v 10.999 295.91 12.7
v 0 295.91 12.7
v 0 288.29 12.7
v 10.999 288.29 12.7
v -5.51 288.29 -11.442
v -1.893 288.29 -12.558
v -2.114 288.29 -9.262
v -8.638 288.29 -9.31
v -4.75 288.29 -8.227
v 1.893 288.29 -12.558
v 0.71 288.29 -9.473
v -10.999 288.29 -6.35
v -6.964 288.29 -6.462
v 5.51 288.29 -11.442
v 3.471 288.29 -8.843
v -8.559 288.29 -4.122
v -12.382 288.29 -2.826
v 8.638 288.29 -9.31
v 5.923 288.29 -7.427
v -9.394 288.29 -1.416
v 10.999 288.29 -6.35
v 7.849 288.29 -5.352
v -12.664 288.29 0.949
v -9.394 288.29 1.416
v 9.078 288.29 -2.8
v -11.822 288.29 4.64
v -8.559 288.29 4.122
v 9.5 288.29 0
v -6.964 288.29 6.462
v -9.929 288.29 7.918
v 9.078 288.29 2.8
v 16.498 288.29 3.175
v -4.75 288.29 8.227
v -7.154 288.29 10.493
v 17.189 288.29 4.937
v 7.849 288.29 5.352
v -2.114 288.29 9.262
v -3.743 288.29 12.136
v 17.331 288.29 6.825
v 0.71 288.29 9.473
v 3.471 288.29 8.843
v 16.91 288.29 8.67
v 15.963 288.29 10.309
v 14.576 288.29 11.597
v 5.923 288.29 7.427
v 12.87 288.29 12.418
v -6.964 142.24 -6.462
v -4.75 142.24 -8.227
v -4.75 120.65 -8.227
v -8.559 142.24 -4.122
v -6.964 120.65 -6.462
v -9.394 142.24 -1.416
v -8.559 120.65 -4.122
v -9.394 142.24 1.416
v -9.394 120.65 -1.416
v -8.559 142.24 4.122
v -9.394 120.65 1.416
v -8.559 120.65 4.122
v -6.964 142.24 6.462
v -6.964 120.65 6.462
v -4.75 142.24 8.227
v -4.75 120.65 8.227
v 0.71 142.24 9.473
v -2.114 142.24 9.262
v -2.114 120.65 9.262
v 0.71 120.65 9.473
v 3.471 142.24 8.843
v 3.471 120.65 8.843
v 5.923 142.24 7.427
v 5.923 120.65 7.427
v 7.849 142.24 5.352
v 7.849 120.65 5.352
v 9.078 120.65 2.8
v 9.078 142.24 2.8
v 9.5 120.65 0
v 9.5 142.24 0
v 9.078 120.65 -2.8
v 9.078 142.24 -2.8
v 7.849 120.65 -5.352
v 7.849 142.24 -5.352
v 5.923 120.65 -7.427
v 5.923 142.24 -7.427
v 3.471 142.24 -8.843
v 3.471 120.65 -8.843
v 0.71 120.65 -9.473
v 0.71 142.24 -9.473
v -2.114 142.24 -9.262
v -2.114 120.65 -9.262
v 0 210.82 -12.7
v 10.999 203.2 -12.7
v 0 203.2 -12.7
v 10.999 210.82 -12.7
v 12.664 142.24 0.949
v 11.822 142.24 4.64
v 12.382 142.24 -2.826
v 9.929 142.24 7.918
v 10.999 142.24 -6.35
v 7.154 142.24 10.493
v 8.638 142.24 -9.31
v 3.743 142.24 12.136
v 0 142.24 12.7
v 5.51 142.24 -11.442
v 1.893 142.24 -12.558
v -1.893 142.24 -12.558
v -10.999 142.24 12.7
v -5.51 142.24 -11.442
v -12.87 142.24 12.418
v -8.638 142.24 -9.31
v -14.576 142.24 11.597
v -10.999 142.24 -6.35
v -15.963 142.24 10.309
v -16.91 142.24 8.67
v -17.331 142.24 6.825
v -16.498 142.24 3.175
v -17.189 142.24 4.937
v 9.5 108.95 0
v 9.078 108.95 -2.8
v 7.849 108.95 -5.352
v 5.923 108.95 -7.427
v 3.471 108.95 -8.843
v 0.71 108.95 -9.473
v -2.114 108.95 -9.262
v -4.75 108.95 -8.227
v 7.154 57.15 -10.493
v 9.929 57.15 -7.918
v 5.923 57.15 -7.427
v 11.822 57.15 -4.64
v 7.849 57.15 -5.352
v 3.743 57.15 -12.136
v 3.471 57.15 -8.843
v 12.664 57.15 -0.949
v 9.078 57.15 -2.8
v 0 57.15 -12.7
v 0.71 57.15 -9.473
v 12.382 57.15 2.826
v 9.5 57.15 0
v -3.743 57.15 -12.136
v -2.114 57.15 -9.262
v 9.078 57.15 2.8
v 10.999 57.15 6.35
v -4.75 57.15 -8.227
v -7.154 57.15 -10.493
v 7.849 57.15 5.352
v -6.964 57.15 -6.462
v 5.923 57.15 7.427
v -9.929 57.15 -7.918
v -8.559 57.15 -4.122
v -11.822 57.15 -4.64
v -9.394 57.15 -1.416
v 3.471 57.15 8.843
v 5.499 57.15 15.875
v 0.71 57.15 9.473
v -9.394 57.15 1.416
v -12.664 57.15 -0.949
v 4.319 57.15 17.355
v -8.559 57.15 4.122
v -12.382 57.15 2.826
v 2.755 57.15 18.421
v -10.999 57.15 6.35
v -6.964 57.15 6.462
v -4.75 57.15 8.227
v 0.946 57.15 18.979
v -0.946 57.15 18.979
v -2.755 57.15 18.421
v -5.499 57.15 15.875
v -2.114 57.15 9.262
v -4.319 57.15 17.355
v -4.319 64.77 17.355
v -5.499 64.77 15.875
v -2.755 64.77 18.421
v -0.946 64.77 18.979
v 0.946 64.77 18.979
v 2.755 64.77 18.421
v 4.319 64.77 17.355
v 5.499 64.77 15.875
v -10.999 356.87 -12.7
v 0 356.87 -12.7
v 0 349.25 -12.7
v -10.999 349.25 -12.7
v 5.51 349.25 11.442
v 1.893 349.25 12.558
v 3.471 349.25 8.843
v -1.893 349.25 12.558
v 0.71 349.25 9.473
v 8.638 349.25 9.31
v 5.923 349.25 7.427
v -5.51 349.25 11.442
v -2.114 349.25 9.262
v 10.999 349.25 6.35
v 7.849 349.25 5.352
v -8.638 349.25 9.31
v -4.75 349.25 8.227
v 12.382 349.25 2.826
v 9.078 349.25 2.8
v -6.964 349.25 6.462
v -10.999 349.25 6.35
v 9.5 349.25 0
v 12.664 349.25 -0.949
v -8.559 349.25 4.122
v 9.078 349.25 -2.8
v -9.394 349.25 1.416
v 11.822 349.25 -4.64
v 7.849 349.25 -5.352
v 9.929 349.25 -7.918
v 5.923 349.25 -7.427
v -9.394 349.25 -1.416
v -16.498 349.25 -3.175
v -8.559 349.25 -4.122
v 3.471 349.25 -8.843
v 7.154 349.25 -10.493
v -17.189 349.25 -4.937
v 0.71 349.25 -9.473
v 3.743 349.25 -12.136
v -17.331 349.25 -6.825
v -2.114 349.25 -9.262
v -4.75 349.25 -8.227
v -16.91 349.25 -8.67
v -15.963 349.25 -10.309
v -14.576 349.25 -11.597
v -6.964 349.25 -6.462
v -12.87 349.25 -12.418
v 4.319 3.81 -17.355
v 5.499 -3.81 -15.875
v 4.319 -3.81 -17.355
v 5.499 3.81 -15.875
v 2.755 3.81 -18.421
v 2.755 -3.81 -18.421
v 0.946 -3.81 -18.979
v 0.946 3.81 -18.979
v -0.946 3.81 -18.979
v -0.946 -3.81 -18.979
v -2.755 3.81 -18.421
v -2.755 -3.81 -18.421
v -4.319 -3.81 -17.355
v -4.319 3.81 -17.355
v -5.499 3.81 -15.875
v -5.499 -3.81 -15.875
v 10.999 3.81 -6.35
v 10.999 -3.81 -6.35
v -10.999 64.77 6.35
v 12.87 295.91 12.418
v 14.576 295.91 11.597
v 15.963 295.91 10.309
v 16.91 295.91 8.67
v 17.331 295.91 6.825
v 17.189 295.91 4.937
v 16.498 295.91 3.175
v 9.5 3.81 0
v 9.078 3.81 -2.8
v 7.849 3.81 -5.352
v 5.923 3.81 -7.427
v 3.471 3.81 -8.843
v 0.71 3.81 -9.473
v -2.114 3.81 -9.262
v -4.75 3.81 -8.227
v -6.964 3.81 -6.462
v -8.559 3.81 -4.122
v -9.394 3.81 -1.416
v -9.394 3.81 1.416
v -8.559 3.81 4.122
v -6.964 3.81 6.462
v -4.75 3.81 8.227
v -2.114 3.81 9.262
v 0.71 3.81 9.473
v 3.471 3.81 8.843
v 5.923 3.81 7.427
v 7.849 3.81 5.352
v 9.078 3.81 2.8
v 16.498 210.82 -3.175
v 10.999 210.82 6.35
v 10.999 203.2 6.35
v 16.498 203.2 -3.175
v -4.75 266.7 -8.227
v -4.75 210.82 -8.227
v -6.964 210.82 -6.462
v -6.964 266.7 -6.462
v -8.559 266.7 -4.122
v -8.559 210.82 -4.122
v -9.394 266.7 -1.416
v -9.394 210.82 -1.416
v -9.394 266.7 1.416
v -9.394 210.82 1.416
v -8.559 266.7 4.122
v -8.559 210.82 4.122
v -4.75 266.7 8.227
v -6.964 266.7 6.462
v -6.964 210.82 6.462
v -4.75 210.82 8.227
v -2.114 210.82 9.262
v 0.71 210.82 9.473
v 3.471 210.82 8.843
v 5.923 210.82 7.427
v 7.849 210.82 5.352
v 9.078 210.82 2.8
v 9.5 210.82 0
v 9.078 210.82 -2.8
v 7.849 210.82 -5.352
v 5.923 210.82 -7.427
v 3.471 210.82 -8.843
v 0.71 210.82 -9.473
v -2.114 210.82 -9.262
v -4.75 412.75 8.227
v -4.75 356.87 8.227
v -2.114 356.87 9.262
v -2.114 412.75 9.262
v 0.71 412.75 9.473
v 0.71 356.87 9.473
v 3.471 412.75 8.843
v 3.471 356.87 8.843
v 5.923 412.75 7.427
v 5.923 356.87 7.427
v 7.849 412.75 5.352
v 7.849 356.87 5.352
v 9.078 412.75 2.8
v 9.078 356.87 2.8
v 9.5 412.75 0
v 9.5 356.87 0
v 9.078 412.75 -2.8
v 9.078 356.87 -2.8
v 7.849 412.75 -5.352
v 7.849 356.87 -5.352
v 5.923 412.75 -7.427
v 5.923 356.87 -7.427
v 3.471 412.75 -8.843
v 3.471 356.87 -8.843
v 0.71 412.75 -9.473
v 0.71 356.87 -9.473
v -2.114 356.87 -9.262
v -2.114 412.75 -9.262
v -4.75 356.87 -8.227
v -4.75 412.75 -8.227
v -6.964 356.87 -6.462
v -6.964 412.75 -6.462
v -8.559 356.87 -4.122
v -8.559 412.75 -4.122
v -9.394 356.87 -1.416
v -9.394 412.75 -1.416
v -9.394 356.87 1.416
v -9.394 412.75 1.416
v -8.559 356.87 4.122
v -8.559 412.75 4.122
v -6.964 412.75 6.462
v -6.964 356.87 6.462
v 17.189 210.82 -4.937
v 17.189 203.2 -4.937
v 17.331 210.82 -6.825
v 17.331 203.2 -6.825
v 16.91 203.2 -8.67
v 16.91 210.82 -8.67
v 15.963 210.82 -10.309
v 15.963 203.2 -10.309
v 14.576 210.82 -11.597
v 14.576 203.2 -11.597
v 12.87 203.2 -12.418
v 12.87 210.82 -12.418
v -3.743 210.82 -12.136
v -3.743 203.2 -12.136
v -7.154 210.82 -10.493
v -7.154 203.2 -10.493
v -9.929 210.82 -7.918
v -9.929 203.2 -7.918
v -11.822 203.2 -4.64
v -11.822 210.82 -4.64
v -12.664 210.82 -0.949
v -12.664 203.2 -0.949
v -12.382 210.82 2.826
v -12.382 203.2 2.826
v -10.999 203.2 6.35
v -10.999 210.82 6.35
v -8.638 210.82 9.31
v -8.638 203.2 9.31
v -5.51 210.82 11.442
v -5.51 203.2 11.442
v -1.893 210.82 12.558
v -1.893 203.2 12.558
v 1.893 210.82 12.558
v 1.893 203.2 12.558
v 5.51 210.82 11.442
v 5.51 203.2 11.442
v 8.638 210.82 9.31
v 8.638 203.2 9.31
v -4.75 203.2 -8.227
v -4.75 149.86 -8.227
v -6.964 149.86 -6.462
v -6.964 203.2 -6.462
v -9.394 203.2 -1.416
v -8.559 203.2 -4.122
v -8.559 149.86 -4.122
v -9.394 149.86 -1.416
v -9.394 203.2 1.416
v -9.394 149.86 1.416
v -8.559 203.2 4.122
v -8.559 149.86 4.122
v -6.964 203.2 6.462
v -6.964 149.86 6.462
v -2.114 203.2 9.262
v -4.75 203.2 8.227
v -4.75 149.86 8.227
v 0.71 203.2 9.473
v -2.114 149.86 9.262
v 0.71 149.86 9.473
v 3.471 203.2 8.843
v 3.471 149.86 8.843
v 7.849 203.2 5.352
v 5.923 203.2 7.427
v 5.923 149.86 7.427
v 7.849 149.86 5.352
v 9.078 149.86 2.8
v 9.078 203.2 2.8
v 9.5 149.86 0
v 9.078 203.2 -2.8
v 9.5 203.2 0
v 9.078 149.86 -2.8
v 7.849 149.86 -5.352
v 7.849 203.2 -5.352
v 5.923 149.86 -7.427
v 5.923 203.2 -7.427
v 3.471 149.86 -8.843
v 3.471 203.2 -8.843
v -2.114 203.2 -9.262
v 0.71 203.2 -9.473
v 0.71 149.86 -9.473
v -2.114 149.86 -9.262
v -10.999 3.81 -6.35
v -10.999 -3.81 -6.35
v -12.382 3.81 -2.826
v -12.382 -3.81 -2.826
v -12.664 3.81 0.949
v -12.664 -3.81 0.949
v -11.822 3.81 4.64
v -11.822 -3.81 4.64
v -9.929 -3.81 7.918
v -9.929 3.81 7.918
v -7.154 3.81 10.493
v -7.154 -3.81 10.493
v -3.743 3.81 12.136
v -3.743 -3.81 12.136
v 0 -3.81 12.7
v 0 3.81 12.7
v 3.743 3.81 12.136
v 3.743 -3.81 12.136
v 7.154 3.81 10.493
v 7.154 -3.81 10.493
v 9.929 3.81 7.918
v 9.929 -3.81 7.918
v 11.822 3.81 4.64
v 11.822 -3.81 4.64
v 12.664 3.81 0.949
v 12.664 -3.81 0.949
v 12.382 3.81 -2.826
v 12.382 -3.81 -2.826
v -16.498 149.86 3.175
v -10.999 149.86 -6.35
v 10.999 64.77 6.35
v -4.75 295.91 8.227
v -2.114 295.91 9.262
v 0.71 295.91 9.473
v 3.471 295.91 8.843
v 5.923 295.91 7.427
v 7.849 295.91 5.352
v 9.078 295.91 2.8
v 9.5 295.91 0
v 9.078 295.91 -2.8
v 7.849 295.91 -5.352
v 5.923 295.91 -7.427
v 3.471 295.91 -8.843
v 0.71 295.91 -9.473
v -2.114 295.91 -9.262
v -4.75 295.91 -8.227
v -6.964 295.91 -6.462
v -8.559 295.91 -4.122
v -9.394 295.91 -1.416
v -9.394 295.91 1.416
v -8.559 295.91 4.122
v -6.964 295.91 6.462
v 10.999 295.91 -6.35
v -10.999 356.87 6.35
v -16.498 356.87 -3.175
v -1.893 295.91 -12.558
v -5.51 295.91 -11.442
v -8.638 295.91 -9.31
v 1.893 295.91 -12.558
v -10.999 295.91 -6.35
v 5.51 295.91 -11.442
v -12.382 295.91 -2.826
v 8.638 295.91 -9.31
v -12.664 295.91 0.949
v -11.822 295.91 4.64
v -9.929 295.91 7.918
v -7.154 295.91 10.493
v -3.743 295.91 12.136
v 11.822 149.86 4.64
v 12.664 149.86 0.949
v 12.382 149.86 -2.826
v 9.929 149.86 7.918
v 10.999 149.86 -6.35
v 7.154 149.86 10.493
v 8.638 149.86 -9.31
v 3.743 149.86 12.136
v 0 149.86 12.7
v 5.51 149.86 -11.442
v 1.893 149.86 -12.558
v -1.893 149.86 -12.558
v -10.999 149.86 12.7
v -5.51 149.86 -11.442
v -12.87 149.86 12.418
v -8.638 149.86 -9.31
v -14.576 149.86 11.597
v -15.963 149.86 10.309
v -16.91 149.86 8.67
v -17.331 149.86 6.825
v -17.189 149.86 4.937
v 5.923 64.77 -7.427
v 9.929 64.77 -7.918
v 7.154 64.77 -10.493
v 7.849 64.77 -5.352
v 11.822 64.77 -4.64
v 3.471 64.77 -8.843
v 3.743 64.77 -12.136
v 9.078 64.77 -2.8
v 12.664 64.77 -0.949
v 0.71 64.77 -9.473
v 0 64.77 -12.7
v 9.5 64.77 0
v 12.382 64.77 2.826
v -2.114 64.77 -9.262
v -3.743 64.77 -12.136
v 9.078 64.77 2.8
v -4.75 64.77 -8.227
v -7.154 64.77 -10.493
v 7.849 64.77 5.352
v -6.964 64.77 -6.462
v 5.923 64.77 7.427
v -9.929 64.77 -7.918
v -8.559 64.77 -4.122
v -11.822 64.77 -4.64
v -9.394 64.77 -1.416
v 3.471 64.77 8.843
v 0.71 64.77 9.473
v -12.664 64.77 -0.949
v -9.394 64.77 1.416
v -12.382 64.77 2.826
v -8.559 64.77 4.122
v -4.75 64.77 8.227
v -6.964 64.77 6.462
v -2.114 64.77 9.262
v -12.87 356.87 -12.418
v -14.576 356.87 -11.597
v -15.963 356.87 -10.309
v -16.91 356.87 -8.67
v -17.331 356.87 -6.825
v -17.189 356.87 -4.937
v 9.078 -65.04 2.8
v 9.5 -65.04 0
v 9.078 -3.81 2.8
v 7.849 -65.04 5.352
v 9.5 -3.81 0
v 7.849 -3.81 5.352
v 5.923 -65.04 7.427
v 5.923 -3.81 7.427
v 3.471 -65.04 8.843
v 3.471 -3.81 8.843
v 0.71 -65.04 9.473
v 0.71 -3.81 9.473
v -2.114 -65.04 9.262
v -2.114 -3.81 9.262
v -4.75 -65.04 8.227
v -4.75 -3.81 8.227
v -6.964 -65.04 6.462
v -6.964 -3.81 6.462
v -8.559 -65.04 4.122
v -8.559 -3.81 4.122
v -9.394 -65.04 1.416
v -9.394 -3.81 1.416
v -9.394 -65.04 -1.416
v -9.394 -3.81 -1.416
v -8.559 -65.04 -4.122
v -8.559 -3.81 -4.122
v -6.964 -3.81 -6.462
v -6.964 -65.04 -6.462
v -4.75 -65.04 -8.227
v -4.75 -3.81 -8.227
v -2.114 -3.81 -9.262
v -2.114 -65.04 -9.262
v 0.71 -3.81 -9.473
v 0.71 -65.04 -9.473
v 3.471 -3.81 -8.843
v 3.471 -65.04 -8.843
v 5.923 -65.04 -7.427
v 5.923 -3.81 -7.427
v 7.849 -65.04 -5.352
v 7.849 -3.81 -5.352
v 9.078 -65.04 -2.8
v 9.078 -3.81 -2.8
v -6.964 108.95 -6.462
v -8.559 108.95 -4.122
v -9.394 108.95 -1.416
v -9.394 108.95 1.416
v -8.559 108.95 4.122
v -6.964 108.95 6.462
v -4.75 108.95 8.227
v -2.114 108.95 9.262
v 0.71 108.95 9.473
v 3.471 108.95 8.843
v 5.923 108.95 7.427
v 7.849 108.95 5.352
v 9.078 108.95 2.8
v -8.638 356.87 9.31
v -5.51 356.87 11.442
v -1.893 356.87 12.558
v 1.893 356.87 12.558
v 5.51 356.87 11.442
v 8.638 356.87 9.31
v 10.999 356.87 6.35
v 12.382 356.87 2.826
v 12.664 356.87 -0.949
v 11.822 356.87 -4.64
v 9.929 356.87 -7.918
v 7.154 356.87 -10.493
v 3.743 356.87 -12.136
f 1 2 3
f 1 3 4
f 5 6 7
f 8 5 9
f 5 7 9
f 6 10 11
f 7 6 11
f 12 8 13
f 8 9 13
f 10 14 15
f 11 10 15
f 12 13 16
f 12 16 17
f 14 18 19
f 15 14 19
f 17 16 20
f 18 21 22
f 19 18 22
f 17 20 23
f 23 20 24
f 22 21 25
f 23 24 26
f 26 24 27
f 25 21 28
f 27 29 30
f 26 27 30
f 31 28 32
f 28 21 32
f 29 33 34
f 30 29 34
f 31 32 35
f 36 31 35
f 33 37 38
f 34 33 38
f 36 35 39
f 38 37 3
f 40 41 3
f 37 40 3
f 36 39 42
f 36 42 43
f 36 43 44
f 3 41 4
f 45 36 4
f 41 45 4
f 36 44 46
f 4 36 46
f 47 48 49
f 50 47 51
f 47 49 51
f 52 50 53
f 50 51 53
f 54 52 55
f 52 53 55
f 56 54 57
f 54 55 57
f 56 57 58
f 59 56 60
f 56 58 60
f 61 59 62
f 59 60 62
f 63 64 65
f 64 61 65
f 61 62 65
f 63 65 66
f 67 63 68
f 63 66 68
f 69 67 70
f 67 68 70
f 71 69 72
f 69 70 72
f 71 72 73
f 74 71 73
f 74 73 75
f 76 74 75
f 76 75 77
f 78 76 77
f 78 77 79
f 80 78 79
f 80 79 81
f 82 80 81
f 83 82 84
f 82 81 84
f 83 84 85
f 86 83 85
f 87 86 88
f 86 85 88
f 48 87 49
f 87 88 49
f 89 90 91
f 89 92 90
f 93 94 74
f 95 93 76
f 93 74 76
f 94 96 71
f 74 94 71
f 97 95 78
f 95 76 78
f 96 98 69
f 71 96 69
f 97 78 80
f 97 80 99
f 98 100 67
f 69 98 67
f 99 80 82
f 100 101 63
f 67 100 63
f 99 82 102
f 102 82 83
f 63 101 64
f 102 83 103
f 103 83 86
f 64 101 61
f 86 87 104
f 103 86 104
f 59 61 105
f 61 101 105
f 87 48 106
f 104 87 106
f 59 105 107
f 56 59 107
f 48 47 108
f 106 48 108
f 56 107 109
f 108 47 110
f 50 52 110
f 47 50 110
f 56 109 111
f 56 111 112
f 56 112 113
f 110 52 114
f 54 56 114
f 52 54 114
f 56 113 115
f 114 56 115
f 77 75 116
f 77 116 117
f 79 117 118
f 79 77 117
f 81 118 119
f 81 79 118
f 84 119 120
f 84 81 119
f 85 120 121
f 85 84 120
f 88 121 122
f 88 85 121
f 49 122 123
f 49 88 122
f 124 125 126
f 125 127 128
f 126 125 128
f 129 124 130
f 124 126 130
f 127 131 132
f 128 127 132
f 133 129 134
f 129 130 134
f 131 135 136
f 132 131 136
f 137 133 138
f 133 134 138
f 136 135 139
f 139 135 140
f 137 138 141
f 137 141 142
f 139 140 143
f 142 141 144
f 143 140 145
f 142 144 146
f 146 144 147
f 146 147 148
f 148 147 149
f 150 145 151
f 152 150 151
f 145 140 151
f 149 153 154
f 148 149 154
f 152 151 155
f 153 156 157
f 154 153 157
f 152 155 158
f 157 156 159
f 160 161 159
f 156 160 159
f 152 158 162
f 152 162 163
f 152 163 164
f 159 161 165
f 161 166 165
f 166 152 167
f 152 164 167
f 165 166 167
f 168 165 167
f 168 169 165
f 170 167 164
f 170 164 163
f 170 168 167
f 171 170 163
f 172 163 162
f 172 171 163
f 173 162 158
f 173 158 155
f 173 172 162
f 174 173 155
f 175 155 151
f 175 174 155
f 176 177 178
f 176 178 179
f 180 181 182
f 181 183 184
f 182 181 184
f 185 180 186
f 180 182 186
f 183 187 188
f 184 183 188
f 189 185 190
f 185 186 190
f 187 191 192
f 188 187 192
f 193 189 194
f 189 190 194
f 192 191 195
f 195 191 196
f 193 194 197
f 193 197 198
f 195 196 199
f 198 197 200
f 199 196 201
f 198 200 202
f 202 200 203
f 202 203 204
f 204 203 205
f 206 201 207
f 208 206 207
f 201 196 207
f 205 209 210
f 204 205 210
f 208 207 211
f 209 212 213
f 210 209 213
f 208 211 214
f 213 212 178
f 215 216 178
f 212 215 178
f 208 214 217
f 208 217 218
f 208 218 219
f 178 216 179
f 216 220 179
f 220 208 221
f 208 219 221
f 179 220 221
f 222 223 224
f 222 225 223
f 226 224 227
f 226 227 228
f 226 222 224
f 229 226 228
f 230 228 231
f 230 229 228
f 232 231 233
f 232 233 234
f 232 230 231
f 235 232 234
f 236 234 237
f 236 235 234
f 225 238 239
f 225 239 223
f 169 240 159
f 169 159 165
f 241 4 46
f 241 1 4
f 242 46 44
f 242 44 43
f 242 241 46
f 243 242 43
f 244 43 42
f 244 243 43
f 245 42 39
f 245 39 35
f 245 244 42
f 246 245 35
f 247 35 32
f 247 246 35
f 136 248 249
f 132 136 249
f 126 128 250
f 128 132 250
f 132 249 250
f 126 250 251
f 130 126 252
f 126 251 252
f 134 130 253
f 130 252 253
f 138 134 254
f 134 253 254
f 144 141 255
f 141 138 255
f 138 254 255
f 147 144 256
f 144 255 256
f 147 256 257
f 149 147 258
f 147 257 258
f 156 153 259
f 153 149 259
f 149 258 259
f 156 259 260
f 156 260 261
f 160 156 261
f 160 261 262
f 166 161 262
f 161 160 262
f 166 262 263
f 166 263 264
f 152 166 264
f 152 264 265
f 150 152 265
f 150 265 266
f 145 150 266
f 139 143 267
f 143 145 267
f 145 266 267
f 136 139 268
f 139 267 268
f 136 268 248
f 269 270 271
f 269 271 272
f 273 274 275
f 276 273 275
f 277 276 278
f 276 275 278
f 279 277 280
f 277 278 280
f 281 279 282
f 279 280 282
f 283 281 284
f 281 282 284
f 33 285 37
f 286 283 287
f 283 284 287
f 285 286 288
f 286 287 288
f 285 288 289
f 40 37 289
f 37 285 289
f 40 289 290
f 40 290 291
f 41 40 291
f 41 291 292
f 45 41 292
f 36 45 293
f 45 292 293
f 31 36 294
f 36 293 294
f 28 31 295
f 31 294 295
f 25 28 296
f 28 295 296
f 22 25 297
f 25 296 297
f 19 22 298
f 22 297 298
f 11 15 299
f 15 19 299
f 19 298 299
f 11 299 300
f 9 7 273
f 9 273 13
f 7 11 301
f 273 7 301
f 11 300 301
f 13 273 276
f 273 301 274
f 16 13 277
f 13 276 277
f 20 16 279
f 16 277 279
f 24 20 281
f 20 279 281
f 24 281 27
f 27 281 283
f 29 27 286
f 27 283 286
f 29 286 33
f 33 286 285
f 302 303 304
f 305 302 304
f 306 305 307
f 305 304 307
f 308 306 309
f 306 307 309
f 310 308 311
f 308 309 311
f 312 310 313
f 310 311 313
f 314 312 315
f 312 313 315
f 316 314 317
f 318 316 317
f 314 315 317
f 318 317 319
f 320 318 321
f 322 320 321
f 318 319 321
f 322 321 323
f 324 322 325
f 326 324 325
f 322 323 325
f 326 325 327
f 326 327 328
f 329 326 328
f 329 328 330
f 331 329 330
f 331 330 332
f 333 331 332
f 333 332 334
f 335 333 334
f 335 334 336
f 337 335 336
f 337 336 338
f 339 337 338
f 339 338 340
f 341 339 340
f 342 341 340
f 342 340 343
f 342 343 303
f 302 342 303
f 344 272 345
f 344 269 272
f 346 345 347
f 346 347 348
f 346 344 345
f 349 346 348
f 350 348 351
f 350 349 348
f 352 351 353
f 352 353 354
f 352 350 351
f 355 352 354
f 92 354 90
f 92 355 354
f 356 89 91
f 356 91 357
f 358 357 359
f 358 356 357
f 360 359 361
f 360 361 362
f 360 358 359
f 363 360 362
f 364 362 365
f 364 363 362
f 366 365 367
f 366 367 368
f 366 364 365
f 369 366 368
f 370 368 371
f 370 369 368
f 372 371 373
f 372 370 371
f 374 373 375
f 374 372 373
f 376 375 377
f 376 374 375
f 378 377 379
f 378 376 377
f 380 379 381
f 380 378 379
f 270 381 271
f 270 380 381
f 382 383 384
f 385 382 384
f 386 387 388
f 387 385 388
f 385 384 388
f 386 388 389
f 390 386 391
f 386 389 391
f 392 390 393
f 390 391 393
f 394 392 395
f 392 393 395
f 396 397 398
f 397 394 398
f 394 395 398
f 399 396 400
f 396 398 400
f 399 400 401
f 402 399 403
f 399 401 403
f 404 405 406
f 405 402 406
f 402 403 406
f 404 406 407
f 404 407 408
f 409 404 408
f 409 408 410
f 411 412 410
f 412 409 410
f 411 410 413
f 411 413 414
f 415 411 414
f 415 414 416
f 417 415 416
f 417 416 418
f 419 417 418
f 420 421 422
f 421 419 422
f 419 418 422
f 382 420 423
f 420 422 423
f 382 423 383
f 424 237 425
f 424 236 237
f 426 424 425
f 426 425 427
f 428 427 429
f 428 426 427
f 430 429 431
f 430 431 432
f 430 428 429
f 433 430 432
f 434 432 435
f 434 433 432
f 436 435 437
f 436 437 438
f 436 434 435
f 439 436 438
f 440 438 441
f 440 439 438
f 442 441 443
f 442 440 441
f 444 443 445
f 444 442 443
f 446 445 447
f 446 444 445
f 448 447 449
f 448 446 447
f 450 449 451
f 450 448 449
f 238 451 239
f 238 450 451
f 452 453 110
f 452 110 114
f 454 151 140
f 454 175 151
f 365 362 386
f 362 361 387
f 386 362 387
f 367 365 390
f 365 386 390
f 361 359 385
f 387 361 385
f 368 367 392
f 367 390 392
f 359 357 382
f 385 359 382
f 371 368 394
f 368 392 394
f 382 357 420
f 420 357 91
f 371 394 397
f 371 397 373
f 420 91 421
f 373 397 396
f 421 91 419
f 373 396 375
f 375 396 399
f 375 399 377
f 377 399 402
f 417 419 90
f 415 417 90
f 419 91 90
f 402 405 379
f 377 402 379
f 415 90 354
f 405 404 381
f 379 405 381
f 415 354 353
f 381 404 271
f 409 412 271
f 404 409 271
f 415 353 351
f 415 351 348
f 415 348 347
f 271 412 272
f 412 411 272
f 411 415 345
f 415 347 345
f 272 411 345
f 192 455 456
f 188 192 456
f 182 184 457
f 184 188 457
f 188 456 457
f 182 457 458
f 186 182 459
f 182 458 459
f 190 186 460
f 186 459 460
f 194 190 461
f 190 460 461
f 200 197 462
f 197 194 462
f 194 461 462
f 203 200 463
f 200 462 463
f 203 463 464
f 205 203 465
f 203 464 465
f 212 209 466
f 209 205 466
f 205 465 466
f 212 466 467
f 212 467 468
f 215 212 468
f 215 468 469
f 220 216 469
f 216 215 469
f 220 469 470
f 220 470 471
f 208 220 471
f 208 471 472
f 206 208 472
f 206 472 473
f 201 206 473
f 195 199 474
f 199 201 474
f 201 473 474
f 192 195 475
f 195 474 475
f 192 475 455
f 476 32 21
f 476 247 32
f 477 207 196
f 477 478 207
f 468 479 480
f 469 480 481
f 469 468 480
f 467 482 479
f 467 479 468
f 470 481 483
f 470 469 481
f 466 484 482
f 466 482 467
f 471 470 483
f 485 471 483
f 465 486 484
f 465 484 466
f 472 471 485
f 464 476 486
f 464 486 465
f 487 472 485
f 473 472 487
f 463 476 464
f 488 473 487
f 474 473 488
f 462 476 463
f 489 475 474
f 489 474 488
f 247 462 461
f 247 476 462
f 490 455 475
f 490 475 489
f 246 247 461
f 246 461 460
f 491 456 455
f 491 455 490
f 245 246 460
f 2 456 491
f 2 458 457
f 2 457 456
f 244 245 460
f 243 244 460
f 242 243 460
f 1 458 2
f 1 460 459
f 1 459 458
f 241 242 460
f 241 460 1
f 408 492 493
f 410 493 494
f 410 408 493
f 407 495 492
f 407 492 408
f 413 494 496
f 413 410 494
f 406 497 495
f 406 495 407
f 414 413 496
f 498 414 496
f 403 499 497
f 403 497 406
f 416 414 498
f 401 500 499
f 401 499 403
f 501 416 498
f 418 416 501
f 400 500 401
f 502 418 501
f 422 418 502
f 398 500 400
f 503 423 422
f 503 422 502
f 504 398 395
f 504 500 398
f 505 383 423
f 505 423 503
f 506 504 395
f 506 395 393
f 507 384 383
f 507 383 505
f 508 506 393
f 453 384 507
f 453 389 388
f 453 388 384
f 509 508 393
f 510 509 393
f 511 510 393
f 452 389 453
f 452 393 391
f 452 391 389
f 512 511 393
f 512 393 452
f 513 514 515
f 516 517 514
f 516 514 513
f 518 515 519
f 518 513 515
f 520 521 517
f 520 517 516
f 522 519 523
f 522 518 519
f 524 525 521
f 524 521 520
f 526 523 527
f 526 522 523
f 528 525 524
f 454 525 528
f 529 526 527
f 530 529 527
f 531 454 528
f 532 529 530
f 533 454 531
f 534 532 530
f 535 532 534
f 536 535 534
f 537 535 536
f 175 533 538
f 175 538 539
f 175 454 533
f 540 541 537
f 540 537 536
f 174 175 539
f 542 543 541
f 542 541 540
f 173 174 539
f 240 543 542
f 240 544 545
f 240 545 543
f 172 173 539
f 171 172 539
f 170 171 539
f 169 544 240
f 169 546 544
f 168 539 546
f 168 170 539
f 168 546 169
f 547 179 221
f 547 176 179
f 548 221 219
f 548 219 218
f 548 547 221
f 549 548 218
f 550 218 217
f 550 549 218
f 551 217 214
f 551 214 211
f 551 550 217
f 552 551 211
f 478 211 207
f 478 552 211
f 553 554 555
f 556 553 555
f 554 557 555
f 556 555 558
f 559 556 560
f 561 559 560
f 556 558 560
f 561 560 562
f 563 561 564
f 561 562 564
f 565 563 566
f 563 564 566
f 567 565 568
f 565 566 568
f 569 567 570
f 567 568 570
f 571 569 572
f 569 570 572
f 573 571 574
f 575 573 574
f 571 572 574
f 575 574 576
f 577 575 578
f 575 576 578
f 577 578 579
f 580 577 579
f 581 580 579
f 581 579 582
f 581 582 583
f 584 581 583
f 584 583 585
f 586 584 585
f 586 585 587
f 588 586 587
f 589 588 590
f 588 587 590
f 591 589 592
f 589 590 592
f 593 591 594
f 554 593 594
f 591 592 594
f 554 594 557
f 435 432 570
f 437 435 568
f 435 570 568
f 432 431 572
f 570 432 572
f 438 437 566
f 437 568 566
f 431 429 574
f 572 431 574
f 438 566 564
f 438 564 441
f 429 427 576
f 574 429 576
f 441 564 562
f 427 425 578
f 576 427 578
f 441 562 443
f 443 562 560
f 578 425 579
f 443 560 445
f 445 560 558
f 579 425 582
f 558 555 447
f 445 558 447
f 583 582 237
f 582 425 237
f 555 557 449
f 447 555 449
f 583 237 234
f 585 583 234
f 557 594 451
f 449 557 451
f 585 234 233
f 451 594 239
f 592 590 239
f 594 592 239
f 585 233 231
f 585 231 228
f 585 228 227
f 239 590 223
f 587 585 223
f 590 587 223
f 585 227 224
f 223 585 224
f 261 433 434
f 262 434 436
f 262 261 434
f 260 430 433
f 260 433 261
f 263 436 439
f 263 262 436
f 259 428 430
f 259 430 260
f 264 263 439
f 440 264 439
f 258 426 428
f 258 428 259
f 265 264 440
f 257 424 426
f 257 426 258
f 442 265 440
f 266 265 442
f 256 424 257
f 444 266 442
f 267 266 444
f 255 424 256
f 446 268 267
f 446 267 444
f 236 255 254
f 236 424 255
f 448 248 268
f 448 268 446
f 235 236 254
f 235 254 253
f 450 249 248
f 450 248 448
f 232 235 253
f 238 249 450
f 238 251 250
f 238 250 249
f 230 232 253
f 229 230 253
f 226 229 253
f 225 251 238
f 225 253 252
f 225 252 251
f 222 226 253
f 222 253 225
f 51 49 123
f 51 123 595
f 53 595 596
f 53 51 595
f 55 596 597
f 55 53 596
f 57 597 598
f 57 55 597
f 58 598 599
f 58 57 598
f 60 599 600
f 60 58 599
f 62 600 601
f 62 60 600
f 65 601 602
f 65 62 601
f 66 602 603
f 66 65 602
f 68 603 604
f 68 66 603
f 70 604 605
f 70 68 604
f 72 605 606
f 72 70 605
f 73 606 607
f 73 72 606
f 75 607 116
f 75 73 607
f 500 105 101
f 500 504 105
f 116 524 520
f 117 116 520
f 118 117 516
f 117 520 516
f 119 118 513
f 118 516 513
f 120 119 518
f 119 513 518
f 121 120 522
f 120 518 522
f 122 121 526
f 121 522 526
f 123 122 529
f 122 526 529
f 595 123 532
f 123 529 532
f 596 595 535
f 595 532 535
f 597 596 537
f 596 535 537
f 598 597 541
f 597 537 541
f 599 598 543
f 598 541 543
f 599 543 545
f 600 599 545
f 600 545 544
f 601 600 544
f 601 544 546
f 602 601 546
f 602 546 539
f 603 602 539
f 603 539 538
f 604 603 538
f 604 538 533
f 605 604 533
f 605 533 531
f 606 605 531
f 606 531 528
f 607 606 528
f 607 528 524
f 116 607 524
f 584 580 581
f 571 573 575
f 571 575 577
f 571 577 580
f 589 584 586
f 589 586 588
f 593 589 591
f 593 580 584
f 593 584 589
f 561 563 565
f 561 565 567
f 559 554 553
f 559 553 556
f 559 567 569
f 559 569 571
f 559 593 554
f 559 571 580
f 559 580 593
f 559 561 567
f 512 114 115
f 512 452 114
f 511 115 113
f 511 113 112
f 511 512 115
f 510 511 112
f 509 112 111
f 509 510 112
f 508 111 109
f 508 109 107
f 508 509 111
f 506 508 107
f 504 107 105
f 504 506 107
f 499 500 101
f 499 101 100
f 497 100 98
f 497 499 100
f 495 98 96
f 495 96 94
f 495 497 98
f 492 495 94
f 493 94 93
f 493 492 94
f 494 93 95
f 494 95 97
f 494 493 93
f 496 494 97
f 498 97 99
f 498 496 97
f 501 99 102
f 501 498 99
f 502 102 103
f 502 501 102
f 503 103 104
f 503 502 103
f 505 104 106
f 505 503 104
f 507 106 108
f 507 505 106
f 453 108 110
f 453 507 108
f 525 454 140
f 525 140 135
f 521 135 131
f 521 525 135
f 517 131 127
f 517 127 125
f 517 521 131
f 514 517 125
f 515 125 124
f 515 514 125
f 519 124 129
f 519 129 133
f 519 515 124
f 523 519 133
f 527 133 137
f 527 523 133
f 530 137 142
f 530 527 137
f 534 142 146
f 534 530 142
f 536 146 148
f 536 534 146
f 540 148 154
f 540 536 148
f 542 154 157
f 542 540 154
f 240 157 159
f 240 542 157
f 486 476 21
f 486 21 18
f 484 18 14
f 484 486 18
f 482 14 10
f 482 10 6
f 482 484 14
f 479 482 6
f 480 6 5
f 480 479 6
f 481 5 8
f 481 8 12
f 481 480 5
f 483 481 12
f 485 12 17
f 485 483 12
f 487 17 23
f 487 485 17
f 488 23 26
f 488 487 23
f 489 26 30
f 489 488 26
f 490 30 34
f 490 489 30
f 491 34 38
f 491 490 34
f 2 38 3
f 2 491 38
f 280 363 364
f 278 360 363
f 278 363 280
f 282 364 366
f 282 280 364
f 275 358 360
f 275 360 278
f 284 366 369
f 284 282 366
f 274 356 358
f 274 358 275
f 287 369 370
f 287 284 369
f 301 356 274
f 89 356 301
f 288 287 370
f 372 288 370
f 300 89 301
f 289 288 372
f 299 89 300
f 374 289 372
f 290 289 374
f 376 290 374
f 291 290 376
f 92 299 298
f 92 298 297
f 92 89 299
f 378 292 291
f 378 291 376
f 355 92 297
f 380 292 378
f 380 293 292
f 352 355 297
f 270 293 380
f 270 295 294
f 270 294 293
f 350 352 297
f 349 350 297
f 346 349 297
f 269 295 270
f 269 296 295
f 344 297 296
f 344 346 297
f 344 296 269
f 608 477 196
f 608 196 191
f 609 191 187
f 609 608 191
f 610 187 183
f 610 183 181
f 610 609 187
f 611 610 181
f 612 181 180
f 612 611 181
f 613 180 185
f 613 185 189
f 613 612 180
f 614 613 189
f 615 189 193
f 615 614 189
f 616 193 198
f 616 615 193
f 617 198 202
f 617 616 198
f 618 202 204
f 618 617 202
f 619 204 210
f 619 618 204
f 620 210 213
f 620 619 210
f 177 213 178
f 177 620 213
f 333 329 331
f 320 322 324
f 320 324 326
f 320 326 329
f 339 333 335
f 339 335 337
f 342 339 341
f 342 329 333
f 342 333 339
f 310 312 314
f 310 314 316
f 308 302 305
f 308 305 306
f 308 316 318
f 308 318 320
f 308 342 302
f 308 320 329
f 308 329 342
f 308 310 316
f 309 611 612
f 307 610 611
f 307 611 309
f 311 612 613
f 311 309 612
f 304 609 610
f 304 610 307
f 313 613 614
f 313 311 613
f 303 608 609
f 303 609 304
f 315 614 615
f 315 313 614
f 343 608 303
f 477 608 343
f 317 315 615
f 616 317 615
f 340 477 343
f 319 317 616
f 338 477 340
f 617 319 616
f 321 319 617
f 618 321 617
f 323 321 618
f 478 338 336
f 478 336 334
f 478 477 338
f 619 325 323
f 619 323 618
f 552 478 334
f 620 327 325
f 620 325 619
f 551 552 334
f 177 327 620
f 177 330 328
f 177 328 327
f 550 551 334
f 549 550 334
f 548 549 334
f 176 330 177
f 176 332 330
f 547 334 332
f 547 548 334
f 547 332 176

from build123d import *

# Parameters (mm, degrees)
BOSS_EXTRUDE1_DEPTH      = 3.81
BODY_MOVE_COPY2_ANGLE    = 180
BOSS_EXTRUDE2_DEPTH      = 146.05
BOSS_EXTRUDE2_DEPTH_BACK = 11.7
BOSS_EXTRUDE2_START      = -25.4
SKETCH2_R                = 9.5
LPATTERN1_COUNT          = 3
LPATTERN1_PITCH          = 146.05
BODY_MOVE_COPY3_ANGLE    = 120
BODY_MOVE_COPY4_ANGLE    = 120
SKETCH3_R                = 9.5
BOSS_EXTRUDE3_DEPTH      = 27.94


with BuildPart() as part:
    # Sketch1 → Boss-Extrude1 (new, symmetric)
    with BuildSketch(Plane(origin=(0, 0, 0), x_dir=(1, 0, 0), z_dir=(0, 1, 0))):
        with BuildLine():
            Line((-5.499261314, 15.875), (-10.998522628, 6.35))
            ThreePointArc((-10.998522628, 6.35), (0, -12.7), (10.998522628, 6.35))
            Line((10.998522628, 6.35), (5.499261314, 15.875))
            ThreePointArc((5.499261314, 15.875), (0, 19.05), (-5.499261314, 15.875))
        make_face()
    extrude(amount=BOSS_EXTRUDE1_DEPTH, both=True)


with BuildPart() as body_2:
    # Body-Move/Copy1: copy of part
    add(part.part.moved(Location((0, 60.96, 0))))


with BuildPart() as body_2_1:
    # Body-Move/Copy2: moved
    add(body_2.part.rotate(Axis((0, 0, 0), (0, 1, 0)), BODY_MOVE_COPY2_ANGLE))


with BuildPart() as part_1:
    add(part.part)

    add(body_2_1.part)  # Boss-Extrude2 merges body 2
    # Sketch2 → Boss-Extrude2 (add, two sides: drawn at the far end of the back side and taken through both)
    with BuildSketch(Plane(origin=(0, 0, 0), x_dir=(1, 0, 0), z_dir=(0, 1, 0)).offset(BOSS_EXTRUDE2_START - BOSS_EXTRUDE2_DEPTH_BACK)):
        Circle(SKETCH2_R)
    extrude(amount=BOSS_EXTRUDE2_DEPTH + BOSS_EXTRUDE2_DEPTH_BACK)


with BuildPart() as lpattern1_1:
    # LPattern1: pattern copy
    add(part_1.part.moved(Location(Vector(0, 1, 0) * (1 * LPATTERN1_PITCH))))


with BuildPart() as lpattern1_2:
    # LPattern1: pattern copy
    add(part_1.part.moved(Location(Vector(0, 1, 0) * (2 * LPATTERN1_PITCH))))


with BuildPart() as lpattern1_1_1:
    # Body-Move/Copy3: moved
    add(lpattern1_1.part.rotate(Axis((0, 0, 0), (0, 1, 0)), BODY_MOVE_COPY3_ANGLE))


with BuildPart() as lpattern1_2_1:
    # Body-Move/Copy4: moved
    add(lpattern1_2.part.rotate(Axis((0, 0, 0), (0, -1, 0)), BODY_MOVE_COPY4_ANGLE))


with BuildPart() as lpattern1_1_2:
    add(lpattern1_1_1.part)

    # Combine1: union LPattern1_2, part
    add(lpattern1_2_1.part)
    add(part_1.part)

    # Sketch3 → Boss-Extrude3 (add)
    with BuildSketch(Plane.XZ.offset(37.1)):
        Circle(SKETCH3_R)
    extrude(amount=BOSS_EXTRUDE3_DEPTH)


solid = lpattern1_1_2.part
